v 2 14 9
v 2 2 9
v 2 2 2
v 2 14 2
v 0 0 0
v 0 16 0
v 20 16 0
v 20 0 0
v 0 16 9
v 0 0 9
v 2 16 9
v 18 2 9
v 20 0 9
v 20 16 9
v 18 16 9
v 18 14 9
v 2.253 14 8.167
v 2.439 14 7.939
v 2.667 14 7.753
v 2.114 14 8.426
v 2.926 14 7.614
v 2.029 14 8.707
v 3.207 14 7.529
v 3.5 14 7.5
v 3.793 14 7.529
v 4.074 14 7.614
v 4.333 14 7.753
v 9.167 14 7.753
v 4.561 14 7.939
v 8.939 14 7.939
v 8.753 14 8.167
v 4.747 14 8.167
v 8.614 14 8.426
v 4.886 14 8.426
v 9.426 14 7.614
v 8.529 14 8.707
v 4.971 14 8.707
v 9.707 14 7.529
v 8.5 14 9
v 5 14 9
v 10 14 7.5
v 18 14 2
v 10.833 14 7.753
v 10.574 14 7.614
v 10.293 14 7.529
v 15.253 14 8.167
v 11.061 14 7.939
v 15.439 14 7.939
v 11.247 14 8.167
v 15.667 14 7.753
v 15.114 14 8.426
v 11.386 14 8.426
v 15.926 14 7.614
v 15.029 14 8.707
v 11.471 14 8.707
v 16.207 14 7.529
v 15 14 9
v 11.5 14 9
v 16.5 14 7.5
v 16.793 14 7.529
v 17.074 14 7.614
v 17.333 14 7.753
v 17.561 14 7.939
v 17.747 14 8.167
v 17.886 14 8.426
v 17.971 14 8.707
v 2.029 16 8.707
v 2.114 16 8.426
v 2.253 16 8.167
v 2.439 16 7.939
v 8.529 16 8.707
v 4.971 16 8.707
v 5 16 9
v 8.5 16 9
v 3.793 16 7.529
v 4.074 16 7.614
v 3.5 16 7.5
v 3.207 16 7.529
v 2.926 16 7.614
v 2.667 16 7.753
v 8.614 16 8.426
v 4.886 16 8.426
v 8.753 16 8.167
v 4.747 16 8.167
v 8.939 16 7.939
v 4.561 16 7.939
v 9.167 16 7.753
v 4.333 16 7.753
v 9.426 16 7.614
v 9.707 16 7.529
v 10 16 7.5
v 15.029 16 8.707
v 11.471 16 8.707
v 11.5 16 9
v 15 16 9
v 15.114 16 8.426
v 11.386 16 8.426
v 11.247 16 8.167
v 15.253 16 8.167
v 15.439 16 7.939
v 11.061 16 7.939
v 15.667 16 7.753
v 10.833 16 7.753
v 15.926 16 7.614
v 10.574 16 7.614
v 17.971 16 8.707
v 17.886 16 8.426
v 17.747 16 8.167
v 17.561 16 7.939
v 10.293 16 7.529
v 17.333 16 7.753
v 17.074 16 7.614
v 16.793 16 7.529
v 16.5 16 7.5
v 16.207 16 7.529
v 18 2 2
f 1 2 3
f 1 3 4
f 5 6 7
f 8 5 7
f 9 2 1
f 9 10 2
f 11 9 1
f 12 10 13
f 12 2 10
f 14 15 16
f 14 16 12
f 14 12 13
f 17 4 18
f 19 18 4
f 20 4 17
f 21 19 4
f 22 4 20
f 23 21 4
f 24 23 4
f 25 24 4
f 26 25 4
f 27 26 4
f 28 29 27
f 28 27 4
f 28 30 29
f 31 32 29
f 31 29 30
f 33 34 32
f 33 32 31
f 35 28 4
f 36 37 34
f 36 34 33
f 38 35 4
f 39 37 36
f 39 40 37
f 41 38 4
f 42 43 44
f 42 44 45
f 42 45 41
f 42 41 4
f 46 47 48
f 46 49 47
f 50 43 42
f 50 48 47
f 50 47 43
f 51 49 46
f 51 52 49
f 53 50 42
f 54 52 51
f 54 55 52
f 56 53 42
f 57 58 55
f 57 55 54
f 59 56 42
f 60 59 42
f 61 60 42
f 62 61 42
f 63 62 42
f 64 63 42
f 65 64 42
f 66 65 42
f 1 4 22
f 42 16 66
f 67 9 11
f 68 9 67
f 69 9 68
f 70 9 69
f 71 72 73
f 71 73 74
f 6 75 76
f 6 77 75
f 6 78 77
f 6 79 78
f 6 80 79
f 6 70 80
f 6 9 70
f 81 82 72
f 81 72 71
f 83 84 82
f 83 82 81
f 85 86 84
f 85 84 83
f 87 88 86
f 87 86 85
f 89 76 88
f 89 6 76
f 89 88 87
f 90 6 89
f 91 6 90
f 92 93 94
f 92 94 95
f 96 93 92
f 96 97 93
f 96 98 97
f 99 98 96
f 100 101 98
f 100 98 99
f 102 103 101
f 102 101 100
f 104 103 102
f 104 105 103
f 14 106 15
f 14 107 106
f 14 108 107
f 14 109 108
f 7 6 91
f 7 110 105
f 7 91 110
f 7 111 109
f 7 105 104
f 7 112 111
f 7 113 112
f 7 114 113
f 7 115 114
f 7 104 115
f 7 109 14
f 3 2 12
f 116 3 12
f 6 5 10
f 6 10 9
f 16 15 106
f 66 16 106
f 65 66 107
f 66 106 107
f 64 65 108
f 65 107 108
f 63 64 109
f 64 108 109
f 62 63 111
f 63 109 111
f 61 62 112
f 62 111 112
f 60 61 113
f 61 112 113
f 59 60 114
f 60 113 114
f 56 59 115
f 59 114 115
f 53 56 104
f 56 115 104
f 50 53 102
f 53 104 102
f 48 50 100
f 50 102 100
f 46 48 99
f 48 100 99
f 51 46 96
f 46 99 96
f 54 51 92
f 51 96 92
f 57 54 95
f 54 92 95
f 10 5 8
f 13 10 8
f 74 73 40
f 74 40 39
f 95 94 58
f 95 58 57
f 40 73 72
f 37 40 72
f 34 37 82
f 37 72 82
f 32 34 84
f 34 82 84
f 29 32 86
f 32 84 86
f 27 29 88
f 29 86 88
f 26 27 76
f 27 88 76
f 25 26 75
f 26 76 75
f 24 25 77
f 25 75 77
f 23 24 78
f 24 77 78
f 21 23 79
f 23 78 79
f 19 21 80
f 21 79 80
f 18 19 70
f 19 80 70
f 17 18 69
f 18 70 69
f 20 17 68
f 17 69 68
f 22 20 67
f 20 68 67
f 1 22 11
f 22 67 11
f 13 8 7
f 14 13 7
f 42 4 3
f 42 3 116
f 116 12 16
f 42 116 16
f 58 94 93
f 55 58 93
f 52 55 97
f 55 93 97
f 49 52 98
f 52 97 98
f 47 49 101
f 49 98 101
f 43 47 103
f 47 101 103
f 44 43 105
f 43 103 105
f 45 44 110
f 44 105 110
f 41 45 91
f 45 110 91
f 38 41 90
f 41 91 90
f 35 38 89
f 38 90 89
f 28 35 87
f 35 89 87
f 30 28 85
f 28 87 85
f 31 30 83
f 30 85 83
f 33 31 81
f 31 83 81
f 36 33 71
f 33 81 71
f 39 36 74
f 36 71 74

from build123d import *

# Parameters (mm, degrees)
SKETCH1_W           = 20
SKETCH1_H           = 16
BOSS_EXTRUDE1_DEPTH = 9
SKETCH2_W           = 16
SKETCH2_H           = 12
CUT_EXTRUDE1_DEPTH  = 7
SKETCH4_R           = 1.5
CUT_EXTRUDE3_DEPTH  = 7


with BuildPart() as part:
    # Sketch1 → Boss-Extrude1 (new body)
    with BuildSketch(Plane.XY):
        with Locations((10, 8)):
            Rectangle(SKETCH1_W, SKETCH1_H)
    extrude(amount=BOSS_EXTRUDE1_DEPTH)

    # Sketch2 → Cut-Extrude1 (cut)
    with BuildSketch(Plane.XY.offset(9)):
        with Locations((10, 8)):
            Rectangle(SKETCH2_W, SKETCH2_H)
    extrude(amount=-CUT_EXTRUDE1_DEPTH, mode=Mode.SUBTRACT)

    # Sketch4 → Cut-Extrude3 (cut)
    with BuildSketch(Plane(origin=(0, 16, 0), x_dir=(1, 0, 0), z_dir=(0, 1, 0))):
        with Locations((3.5, -9)):
            Circle(SKETCH4_R)
        with Locations((10, -9)):
            Circle(SKETCH4_R)
        with Locations((16.5, -9)):
            Circle(SKETCH4_R)
    extrude(amount=-CUT_EXTRUDE3_DEPTH, mode=Mode.SUBTRACT)


solid = part.part
